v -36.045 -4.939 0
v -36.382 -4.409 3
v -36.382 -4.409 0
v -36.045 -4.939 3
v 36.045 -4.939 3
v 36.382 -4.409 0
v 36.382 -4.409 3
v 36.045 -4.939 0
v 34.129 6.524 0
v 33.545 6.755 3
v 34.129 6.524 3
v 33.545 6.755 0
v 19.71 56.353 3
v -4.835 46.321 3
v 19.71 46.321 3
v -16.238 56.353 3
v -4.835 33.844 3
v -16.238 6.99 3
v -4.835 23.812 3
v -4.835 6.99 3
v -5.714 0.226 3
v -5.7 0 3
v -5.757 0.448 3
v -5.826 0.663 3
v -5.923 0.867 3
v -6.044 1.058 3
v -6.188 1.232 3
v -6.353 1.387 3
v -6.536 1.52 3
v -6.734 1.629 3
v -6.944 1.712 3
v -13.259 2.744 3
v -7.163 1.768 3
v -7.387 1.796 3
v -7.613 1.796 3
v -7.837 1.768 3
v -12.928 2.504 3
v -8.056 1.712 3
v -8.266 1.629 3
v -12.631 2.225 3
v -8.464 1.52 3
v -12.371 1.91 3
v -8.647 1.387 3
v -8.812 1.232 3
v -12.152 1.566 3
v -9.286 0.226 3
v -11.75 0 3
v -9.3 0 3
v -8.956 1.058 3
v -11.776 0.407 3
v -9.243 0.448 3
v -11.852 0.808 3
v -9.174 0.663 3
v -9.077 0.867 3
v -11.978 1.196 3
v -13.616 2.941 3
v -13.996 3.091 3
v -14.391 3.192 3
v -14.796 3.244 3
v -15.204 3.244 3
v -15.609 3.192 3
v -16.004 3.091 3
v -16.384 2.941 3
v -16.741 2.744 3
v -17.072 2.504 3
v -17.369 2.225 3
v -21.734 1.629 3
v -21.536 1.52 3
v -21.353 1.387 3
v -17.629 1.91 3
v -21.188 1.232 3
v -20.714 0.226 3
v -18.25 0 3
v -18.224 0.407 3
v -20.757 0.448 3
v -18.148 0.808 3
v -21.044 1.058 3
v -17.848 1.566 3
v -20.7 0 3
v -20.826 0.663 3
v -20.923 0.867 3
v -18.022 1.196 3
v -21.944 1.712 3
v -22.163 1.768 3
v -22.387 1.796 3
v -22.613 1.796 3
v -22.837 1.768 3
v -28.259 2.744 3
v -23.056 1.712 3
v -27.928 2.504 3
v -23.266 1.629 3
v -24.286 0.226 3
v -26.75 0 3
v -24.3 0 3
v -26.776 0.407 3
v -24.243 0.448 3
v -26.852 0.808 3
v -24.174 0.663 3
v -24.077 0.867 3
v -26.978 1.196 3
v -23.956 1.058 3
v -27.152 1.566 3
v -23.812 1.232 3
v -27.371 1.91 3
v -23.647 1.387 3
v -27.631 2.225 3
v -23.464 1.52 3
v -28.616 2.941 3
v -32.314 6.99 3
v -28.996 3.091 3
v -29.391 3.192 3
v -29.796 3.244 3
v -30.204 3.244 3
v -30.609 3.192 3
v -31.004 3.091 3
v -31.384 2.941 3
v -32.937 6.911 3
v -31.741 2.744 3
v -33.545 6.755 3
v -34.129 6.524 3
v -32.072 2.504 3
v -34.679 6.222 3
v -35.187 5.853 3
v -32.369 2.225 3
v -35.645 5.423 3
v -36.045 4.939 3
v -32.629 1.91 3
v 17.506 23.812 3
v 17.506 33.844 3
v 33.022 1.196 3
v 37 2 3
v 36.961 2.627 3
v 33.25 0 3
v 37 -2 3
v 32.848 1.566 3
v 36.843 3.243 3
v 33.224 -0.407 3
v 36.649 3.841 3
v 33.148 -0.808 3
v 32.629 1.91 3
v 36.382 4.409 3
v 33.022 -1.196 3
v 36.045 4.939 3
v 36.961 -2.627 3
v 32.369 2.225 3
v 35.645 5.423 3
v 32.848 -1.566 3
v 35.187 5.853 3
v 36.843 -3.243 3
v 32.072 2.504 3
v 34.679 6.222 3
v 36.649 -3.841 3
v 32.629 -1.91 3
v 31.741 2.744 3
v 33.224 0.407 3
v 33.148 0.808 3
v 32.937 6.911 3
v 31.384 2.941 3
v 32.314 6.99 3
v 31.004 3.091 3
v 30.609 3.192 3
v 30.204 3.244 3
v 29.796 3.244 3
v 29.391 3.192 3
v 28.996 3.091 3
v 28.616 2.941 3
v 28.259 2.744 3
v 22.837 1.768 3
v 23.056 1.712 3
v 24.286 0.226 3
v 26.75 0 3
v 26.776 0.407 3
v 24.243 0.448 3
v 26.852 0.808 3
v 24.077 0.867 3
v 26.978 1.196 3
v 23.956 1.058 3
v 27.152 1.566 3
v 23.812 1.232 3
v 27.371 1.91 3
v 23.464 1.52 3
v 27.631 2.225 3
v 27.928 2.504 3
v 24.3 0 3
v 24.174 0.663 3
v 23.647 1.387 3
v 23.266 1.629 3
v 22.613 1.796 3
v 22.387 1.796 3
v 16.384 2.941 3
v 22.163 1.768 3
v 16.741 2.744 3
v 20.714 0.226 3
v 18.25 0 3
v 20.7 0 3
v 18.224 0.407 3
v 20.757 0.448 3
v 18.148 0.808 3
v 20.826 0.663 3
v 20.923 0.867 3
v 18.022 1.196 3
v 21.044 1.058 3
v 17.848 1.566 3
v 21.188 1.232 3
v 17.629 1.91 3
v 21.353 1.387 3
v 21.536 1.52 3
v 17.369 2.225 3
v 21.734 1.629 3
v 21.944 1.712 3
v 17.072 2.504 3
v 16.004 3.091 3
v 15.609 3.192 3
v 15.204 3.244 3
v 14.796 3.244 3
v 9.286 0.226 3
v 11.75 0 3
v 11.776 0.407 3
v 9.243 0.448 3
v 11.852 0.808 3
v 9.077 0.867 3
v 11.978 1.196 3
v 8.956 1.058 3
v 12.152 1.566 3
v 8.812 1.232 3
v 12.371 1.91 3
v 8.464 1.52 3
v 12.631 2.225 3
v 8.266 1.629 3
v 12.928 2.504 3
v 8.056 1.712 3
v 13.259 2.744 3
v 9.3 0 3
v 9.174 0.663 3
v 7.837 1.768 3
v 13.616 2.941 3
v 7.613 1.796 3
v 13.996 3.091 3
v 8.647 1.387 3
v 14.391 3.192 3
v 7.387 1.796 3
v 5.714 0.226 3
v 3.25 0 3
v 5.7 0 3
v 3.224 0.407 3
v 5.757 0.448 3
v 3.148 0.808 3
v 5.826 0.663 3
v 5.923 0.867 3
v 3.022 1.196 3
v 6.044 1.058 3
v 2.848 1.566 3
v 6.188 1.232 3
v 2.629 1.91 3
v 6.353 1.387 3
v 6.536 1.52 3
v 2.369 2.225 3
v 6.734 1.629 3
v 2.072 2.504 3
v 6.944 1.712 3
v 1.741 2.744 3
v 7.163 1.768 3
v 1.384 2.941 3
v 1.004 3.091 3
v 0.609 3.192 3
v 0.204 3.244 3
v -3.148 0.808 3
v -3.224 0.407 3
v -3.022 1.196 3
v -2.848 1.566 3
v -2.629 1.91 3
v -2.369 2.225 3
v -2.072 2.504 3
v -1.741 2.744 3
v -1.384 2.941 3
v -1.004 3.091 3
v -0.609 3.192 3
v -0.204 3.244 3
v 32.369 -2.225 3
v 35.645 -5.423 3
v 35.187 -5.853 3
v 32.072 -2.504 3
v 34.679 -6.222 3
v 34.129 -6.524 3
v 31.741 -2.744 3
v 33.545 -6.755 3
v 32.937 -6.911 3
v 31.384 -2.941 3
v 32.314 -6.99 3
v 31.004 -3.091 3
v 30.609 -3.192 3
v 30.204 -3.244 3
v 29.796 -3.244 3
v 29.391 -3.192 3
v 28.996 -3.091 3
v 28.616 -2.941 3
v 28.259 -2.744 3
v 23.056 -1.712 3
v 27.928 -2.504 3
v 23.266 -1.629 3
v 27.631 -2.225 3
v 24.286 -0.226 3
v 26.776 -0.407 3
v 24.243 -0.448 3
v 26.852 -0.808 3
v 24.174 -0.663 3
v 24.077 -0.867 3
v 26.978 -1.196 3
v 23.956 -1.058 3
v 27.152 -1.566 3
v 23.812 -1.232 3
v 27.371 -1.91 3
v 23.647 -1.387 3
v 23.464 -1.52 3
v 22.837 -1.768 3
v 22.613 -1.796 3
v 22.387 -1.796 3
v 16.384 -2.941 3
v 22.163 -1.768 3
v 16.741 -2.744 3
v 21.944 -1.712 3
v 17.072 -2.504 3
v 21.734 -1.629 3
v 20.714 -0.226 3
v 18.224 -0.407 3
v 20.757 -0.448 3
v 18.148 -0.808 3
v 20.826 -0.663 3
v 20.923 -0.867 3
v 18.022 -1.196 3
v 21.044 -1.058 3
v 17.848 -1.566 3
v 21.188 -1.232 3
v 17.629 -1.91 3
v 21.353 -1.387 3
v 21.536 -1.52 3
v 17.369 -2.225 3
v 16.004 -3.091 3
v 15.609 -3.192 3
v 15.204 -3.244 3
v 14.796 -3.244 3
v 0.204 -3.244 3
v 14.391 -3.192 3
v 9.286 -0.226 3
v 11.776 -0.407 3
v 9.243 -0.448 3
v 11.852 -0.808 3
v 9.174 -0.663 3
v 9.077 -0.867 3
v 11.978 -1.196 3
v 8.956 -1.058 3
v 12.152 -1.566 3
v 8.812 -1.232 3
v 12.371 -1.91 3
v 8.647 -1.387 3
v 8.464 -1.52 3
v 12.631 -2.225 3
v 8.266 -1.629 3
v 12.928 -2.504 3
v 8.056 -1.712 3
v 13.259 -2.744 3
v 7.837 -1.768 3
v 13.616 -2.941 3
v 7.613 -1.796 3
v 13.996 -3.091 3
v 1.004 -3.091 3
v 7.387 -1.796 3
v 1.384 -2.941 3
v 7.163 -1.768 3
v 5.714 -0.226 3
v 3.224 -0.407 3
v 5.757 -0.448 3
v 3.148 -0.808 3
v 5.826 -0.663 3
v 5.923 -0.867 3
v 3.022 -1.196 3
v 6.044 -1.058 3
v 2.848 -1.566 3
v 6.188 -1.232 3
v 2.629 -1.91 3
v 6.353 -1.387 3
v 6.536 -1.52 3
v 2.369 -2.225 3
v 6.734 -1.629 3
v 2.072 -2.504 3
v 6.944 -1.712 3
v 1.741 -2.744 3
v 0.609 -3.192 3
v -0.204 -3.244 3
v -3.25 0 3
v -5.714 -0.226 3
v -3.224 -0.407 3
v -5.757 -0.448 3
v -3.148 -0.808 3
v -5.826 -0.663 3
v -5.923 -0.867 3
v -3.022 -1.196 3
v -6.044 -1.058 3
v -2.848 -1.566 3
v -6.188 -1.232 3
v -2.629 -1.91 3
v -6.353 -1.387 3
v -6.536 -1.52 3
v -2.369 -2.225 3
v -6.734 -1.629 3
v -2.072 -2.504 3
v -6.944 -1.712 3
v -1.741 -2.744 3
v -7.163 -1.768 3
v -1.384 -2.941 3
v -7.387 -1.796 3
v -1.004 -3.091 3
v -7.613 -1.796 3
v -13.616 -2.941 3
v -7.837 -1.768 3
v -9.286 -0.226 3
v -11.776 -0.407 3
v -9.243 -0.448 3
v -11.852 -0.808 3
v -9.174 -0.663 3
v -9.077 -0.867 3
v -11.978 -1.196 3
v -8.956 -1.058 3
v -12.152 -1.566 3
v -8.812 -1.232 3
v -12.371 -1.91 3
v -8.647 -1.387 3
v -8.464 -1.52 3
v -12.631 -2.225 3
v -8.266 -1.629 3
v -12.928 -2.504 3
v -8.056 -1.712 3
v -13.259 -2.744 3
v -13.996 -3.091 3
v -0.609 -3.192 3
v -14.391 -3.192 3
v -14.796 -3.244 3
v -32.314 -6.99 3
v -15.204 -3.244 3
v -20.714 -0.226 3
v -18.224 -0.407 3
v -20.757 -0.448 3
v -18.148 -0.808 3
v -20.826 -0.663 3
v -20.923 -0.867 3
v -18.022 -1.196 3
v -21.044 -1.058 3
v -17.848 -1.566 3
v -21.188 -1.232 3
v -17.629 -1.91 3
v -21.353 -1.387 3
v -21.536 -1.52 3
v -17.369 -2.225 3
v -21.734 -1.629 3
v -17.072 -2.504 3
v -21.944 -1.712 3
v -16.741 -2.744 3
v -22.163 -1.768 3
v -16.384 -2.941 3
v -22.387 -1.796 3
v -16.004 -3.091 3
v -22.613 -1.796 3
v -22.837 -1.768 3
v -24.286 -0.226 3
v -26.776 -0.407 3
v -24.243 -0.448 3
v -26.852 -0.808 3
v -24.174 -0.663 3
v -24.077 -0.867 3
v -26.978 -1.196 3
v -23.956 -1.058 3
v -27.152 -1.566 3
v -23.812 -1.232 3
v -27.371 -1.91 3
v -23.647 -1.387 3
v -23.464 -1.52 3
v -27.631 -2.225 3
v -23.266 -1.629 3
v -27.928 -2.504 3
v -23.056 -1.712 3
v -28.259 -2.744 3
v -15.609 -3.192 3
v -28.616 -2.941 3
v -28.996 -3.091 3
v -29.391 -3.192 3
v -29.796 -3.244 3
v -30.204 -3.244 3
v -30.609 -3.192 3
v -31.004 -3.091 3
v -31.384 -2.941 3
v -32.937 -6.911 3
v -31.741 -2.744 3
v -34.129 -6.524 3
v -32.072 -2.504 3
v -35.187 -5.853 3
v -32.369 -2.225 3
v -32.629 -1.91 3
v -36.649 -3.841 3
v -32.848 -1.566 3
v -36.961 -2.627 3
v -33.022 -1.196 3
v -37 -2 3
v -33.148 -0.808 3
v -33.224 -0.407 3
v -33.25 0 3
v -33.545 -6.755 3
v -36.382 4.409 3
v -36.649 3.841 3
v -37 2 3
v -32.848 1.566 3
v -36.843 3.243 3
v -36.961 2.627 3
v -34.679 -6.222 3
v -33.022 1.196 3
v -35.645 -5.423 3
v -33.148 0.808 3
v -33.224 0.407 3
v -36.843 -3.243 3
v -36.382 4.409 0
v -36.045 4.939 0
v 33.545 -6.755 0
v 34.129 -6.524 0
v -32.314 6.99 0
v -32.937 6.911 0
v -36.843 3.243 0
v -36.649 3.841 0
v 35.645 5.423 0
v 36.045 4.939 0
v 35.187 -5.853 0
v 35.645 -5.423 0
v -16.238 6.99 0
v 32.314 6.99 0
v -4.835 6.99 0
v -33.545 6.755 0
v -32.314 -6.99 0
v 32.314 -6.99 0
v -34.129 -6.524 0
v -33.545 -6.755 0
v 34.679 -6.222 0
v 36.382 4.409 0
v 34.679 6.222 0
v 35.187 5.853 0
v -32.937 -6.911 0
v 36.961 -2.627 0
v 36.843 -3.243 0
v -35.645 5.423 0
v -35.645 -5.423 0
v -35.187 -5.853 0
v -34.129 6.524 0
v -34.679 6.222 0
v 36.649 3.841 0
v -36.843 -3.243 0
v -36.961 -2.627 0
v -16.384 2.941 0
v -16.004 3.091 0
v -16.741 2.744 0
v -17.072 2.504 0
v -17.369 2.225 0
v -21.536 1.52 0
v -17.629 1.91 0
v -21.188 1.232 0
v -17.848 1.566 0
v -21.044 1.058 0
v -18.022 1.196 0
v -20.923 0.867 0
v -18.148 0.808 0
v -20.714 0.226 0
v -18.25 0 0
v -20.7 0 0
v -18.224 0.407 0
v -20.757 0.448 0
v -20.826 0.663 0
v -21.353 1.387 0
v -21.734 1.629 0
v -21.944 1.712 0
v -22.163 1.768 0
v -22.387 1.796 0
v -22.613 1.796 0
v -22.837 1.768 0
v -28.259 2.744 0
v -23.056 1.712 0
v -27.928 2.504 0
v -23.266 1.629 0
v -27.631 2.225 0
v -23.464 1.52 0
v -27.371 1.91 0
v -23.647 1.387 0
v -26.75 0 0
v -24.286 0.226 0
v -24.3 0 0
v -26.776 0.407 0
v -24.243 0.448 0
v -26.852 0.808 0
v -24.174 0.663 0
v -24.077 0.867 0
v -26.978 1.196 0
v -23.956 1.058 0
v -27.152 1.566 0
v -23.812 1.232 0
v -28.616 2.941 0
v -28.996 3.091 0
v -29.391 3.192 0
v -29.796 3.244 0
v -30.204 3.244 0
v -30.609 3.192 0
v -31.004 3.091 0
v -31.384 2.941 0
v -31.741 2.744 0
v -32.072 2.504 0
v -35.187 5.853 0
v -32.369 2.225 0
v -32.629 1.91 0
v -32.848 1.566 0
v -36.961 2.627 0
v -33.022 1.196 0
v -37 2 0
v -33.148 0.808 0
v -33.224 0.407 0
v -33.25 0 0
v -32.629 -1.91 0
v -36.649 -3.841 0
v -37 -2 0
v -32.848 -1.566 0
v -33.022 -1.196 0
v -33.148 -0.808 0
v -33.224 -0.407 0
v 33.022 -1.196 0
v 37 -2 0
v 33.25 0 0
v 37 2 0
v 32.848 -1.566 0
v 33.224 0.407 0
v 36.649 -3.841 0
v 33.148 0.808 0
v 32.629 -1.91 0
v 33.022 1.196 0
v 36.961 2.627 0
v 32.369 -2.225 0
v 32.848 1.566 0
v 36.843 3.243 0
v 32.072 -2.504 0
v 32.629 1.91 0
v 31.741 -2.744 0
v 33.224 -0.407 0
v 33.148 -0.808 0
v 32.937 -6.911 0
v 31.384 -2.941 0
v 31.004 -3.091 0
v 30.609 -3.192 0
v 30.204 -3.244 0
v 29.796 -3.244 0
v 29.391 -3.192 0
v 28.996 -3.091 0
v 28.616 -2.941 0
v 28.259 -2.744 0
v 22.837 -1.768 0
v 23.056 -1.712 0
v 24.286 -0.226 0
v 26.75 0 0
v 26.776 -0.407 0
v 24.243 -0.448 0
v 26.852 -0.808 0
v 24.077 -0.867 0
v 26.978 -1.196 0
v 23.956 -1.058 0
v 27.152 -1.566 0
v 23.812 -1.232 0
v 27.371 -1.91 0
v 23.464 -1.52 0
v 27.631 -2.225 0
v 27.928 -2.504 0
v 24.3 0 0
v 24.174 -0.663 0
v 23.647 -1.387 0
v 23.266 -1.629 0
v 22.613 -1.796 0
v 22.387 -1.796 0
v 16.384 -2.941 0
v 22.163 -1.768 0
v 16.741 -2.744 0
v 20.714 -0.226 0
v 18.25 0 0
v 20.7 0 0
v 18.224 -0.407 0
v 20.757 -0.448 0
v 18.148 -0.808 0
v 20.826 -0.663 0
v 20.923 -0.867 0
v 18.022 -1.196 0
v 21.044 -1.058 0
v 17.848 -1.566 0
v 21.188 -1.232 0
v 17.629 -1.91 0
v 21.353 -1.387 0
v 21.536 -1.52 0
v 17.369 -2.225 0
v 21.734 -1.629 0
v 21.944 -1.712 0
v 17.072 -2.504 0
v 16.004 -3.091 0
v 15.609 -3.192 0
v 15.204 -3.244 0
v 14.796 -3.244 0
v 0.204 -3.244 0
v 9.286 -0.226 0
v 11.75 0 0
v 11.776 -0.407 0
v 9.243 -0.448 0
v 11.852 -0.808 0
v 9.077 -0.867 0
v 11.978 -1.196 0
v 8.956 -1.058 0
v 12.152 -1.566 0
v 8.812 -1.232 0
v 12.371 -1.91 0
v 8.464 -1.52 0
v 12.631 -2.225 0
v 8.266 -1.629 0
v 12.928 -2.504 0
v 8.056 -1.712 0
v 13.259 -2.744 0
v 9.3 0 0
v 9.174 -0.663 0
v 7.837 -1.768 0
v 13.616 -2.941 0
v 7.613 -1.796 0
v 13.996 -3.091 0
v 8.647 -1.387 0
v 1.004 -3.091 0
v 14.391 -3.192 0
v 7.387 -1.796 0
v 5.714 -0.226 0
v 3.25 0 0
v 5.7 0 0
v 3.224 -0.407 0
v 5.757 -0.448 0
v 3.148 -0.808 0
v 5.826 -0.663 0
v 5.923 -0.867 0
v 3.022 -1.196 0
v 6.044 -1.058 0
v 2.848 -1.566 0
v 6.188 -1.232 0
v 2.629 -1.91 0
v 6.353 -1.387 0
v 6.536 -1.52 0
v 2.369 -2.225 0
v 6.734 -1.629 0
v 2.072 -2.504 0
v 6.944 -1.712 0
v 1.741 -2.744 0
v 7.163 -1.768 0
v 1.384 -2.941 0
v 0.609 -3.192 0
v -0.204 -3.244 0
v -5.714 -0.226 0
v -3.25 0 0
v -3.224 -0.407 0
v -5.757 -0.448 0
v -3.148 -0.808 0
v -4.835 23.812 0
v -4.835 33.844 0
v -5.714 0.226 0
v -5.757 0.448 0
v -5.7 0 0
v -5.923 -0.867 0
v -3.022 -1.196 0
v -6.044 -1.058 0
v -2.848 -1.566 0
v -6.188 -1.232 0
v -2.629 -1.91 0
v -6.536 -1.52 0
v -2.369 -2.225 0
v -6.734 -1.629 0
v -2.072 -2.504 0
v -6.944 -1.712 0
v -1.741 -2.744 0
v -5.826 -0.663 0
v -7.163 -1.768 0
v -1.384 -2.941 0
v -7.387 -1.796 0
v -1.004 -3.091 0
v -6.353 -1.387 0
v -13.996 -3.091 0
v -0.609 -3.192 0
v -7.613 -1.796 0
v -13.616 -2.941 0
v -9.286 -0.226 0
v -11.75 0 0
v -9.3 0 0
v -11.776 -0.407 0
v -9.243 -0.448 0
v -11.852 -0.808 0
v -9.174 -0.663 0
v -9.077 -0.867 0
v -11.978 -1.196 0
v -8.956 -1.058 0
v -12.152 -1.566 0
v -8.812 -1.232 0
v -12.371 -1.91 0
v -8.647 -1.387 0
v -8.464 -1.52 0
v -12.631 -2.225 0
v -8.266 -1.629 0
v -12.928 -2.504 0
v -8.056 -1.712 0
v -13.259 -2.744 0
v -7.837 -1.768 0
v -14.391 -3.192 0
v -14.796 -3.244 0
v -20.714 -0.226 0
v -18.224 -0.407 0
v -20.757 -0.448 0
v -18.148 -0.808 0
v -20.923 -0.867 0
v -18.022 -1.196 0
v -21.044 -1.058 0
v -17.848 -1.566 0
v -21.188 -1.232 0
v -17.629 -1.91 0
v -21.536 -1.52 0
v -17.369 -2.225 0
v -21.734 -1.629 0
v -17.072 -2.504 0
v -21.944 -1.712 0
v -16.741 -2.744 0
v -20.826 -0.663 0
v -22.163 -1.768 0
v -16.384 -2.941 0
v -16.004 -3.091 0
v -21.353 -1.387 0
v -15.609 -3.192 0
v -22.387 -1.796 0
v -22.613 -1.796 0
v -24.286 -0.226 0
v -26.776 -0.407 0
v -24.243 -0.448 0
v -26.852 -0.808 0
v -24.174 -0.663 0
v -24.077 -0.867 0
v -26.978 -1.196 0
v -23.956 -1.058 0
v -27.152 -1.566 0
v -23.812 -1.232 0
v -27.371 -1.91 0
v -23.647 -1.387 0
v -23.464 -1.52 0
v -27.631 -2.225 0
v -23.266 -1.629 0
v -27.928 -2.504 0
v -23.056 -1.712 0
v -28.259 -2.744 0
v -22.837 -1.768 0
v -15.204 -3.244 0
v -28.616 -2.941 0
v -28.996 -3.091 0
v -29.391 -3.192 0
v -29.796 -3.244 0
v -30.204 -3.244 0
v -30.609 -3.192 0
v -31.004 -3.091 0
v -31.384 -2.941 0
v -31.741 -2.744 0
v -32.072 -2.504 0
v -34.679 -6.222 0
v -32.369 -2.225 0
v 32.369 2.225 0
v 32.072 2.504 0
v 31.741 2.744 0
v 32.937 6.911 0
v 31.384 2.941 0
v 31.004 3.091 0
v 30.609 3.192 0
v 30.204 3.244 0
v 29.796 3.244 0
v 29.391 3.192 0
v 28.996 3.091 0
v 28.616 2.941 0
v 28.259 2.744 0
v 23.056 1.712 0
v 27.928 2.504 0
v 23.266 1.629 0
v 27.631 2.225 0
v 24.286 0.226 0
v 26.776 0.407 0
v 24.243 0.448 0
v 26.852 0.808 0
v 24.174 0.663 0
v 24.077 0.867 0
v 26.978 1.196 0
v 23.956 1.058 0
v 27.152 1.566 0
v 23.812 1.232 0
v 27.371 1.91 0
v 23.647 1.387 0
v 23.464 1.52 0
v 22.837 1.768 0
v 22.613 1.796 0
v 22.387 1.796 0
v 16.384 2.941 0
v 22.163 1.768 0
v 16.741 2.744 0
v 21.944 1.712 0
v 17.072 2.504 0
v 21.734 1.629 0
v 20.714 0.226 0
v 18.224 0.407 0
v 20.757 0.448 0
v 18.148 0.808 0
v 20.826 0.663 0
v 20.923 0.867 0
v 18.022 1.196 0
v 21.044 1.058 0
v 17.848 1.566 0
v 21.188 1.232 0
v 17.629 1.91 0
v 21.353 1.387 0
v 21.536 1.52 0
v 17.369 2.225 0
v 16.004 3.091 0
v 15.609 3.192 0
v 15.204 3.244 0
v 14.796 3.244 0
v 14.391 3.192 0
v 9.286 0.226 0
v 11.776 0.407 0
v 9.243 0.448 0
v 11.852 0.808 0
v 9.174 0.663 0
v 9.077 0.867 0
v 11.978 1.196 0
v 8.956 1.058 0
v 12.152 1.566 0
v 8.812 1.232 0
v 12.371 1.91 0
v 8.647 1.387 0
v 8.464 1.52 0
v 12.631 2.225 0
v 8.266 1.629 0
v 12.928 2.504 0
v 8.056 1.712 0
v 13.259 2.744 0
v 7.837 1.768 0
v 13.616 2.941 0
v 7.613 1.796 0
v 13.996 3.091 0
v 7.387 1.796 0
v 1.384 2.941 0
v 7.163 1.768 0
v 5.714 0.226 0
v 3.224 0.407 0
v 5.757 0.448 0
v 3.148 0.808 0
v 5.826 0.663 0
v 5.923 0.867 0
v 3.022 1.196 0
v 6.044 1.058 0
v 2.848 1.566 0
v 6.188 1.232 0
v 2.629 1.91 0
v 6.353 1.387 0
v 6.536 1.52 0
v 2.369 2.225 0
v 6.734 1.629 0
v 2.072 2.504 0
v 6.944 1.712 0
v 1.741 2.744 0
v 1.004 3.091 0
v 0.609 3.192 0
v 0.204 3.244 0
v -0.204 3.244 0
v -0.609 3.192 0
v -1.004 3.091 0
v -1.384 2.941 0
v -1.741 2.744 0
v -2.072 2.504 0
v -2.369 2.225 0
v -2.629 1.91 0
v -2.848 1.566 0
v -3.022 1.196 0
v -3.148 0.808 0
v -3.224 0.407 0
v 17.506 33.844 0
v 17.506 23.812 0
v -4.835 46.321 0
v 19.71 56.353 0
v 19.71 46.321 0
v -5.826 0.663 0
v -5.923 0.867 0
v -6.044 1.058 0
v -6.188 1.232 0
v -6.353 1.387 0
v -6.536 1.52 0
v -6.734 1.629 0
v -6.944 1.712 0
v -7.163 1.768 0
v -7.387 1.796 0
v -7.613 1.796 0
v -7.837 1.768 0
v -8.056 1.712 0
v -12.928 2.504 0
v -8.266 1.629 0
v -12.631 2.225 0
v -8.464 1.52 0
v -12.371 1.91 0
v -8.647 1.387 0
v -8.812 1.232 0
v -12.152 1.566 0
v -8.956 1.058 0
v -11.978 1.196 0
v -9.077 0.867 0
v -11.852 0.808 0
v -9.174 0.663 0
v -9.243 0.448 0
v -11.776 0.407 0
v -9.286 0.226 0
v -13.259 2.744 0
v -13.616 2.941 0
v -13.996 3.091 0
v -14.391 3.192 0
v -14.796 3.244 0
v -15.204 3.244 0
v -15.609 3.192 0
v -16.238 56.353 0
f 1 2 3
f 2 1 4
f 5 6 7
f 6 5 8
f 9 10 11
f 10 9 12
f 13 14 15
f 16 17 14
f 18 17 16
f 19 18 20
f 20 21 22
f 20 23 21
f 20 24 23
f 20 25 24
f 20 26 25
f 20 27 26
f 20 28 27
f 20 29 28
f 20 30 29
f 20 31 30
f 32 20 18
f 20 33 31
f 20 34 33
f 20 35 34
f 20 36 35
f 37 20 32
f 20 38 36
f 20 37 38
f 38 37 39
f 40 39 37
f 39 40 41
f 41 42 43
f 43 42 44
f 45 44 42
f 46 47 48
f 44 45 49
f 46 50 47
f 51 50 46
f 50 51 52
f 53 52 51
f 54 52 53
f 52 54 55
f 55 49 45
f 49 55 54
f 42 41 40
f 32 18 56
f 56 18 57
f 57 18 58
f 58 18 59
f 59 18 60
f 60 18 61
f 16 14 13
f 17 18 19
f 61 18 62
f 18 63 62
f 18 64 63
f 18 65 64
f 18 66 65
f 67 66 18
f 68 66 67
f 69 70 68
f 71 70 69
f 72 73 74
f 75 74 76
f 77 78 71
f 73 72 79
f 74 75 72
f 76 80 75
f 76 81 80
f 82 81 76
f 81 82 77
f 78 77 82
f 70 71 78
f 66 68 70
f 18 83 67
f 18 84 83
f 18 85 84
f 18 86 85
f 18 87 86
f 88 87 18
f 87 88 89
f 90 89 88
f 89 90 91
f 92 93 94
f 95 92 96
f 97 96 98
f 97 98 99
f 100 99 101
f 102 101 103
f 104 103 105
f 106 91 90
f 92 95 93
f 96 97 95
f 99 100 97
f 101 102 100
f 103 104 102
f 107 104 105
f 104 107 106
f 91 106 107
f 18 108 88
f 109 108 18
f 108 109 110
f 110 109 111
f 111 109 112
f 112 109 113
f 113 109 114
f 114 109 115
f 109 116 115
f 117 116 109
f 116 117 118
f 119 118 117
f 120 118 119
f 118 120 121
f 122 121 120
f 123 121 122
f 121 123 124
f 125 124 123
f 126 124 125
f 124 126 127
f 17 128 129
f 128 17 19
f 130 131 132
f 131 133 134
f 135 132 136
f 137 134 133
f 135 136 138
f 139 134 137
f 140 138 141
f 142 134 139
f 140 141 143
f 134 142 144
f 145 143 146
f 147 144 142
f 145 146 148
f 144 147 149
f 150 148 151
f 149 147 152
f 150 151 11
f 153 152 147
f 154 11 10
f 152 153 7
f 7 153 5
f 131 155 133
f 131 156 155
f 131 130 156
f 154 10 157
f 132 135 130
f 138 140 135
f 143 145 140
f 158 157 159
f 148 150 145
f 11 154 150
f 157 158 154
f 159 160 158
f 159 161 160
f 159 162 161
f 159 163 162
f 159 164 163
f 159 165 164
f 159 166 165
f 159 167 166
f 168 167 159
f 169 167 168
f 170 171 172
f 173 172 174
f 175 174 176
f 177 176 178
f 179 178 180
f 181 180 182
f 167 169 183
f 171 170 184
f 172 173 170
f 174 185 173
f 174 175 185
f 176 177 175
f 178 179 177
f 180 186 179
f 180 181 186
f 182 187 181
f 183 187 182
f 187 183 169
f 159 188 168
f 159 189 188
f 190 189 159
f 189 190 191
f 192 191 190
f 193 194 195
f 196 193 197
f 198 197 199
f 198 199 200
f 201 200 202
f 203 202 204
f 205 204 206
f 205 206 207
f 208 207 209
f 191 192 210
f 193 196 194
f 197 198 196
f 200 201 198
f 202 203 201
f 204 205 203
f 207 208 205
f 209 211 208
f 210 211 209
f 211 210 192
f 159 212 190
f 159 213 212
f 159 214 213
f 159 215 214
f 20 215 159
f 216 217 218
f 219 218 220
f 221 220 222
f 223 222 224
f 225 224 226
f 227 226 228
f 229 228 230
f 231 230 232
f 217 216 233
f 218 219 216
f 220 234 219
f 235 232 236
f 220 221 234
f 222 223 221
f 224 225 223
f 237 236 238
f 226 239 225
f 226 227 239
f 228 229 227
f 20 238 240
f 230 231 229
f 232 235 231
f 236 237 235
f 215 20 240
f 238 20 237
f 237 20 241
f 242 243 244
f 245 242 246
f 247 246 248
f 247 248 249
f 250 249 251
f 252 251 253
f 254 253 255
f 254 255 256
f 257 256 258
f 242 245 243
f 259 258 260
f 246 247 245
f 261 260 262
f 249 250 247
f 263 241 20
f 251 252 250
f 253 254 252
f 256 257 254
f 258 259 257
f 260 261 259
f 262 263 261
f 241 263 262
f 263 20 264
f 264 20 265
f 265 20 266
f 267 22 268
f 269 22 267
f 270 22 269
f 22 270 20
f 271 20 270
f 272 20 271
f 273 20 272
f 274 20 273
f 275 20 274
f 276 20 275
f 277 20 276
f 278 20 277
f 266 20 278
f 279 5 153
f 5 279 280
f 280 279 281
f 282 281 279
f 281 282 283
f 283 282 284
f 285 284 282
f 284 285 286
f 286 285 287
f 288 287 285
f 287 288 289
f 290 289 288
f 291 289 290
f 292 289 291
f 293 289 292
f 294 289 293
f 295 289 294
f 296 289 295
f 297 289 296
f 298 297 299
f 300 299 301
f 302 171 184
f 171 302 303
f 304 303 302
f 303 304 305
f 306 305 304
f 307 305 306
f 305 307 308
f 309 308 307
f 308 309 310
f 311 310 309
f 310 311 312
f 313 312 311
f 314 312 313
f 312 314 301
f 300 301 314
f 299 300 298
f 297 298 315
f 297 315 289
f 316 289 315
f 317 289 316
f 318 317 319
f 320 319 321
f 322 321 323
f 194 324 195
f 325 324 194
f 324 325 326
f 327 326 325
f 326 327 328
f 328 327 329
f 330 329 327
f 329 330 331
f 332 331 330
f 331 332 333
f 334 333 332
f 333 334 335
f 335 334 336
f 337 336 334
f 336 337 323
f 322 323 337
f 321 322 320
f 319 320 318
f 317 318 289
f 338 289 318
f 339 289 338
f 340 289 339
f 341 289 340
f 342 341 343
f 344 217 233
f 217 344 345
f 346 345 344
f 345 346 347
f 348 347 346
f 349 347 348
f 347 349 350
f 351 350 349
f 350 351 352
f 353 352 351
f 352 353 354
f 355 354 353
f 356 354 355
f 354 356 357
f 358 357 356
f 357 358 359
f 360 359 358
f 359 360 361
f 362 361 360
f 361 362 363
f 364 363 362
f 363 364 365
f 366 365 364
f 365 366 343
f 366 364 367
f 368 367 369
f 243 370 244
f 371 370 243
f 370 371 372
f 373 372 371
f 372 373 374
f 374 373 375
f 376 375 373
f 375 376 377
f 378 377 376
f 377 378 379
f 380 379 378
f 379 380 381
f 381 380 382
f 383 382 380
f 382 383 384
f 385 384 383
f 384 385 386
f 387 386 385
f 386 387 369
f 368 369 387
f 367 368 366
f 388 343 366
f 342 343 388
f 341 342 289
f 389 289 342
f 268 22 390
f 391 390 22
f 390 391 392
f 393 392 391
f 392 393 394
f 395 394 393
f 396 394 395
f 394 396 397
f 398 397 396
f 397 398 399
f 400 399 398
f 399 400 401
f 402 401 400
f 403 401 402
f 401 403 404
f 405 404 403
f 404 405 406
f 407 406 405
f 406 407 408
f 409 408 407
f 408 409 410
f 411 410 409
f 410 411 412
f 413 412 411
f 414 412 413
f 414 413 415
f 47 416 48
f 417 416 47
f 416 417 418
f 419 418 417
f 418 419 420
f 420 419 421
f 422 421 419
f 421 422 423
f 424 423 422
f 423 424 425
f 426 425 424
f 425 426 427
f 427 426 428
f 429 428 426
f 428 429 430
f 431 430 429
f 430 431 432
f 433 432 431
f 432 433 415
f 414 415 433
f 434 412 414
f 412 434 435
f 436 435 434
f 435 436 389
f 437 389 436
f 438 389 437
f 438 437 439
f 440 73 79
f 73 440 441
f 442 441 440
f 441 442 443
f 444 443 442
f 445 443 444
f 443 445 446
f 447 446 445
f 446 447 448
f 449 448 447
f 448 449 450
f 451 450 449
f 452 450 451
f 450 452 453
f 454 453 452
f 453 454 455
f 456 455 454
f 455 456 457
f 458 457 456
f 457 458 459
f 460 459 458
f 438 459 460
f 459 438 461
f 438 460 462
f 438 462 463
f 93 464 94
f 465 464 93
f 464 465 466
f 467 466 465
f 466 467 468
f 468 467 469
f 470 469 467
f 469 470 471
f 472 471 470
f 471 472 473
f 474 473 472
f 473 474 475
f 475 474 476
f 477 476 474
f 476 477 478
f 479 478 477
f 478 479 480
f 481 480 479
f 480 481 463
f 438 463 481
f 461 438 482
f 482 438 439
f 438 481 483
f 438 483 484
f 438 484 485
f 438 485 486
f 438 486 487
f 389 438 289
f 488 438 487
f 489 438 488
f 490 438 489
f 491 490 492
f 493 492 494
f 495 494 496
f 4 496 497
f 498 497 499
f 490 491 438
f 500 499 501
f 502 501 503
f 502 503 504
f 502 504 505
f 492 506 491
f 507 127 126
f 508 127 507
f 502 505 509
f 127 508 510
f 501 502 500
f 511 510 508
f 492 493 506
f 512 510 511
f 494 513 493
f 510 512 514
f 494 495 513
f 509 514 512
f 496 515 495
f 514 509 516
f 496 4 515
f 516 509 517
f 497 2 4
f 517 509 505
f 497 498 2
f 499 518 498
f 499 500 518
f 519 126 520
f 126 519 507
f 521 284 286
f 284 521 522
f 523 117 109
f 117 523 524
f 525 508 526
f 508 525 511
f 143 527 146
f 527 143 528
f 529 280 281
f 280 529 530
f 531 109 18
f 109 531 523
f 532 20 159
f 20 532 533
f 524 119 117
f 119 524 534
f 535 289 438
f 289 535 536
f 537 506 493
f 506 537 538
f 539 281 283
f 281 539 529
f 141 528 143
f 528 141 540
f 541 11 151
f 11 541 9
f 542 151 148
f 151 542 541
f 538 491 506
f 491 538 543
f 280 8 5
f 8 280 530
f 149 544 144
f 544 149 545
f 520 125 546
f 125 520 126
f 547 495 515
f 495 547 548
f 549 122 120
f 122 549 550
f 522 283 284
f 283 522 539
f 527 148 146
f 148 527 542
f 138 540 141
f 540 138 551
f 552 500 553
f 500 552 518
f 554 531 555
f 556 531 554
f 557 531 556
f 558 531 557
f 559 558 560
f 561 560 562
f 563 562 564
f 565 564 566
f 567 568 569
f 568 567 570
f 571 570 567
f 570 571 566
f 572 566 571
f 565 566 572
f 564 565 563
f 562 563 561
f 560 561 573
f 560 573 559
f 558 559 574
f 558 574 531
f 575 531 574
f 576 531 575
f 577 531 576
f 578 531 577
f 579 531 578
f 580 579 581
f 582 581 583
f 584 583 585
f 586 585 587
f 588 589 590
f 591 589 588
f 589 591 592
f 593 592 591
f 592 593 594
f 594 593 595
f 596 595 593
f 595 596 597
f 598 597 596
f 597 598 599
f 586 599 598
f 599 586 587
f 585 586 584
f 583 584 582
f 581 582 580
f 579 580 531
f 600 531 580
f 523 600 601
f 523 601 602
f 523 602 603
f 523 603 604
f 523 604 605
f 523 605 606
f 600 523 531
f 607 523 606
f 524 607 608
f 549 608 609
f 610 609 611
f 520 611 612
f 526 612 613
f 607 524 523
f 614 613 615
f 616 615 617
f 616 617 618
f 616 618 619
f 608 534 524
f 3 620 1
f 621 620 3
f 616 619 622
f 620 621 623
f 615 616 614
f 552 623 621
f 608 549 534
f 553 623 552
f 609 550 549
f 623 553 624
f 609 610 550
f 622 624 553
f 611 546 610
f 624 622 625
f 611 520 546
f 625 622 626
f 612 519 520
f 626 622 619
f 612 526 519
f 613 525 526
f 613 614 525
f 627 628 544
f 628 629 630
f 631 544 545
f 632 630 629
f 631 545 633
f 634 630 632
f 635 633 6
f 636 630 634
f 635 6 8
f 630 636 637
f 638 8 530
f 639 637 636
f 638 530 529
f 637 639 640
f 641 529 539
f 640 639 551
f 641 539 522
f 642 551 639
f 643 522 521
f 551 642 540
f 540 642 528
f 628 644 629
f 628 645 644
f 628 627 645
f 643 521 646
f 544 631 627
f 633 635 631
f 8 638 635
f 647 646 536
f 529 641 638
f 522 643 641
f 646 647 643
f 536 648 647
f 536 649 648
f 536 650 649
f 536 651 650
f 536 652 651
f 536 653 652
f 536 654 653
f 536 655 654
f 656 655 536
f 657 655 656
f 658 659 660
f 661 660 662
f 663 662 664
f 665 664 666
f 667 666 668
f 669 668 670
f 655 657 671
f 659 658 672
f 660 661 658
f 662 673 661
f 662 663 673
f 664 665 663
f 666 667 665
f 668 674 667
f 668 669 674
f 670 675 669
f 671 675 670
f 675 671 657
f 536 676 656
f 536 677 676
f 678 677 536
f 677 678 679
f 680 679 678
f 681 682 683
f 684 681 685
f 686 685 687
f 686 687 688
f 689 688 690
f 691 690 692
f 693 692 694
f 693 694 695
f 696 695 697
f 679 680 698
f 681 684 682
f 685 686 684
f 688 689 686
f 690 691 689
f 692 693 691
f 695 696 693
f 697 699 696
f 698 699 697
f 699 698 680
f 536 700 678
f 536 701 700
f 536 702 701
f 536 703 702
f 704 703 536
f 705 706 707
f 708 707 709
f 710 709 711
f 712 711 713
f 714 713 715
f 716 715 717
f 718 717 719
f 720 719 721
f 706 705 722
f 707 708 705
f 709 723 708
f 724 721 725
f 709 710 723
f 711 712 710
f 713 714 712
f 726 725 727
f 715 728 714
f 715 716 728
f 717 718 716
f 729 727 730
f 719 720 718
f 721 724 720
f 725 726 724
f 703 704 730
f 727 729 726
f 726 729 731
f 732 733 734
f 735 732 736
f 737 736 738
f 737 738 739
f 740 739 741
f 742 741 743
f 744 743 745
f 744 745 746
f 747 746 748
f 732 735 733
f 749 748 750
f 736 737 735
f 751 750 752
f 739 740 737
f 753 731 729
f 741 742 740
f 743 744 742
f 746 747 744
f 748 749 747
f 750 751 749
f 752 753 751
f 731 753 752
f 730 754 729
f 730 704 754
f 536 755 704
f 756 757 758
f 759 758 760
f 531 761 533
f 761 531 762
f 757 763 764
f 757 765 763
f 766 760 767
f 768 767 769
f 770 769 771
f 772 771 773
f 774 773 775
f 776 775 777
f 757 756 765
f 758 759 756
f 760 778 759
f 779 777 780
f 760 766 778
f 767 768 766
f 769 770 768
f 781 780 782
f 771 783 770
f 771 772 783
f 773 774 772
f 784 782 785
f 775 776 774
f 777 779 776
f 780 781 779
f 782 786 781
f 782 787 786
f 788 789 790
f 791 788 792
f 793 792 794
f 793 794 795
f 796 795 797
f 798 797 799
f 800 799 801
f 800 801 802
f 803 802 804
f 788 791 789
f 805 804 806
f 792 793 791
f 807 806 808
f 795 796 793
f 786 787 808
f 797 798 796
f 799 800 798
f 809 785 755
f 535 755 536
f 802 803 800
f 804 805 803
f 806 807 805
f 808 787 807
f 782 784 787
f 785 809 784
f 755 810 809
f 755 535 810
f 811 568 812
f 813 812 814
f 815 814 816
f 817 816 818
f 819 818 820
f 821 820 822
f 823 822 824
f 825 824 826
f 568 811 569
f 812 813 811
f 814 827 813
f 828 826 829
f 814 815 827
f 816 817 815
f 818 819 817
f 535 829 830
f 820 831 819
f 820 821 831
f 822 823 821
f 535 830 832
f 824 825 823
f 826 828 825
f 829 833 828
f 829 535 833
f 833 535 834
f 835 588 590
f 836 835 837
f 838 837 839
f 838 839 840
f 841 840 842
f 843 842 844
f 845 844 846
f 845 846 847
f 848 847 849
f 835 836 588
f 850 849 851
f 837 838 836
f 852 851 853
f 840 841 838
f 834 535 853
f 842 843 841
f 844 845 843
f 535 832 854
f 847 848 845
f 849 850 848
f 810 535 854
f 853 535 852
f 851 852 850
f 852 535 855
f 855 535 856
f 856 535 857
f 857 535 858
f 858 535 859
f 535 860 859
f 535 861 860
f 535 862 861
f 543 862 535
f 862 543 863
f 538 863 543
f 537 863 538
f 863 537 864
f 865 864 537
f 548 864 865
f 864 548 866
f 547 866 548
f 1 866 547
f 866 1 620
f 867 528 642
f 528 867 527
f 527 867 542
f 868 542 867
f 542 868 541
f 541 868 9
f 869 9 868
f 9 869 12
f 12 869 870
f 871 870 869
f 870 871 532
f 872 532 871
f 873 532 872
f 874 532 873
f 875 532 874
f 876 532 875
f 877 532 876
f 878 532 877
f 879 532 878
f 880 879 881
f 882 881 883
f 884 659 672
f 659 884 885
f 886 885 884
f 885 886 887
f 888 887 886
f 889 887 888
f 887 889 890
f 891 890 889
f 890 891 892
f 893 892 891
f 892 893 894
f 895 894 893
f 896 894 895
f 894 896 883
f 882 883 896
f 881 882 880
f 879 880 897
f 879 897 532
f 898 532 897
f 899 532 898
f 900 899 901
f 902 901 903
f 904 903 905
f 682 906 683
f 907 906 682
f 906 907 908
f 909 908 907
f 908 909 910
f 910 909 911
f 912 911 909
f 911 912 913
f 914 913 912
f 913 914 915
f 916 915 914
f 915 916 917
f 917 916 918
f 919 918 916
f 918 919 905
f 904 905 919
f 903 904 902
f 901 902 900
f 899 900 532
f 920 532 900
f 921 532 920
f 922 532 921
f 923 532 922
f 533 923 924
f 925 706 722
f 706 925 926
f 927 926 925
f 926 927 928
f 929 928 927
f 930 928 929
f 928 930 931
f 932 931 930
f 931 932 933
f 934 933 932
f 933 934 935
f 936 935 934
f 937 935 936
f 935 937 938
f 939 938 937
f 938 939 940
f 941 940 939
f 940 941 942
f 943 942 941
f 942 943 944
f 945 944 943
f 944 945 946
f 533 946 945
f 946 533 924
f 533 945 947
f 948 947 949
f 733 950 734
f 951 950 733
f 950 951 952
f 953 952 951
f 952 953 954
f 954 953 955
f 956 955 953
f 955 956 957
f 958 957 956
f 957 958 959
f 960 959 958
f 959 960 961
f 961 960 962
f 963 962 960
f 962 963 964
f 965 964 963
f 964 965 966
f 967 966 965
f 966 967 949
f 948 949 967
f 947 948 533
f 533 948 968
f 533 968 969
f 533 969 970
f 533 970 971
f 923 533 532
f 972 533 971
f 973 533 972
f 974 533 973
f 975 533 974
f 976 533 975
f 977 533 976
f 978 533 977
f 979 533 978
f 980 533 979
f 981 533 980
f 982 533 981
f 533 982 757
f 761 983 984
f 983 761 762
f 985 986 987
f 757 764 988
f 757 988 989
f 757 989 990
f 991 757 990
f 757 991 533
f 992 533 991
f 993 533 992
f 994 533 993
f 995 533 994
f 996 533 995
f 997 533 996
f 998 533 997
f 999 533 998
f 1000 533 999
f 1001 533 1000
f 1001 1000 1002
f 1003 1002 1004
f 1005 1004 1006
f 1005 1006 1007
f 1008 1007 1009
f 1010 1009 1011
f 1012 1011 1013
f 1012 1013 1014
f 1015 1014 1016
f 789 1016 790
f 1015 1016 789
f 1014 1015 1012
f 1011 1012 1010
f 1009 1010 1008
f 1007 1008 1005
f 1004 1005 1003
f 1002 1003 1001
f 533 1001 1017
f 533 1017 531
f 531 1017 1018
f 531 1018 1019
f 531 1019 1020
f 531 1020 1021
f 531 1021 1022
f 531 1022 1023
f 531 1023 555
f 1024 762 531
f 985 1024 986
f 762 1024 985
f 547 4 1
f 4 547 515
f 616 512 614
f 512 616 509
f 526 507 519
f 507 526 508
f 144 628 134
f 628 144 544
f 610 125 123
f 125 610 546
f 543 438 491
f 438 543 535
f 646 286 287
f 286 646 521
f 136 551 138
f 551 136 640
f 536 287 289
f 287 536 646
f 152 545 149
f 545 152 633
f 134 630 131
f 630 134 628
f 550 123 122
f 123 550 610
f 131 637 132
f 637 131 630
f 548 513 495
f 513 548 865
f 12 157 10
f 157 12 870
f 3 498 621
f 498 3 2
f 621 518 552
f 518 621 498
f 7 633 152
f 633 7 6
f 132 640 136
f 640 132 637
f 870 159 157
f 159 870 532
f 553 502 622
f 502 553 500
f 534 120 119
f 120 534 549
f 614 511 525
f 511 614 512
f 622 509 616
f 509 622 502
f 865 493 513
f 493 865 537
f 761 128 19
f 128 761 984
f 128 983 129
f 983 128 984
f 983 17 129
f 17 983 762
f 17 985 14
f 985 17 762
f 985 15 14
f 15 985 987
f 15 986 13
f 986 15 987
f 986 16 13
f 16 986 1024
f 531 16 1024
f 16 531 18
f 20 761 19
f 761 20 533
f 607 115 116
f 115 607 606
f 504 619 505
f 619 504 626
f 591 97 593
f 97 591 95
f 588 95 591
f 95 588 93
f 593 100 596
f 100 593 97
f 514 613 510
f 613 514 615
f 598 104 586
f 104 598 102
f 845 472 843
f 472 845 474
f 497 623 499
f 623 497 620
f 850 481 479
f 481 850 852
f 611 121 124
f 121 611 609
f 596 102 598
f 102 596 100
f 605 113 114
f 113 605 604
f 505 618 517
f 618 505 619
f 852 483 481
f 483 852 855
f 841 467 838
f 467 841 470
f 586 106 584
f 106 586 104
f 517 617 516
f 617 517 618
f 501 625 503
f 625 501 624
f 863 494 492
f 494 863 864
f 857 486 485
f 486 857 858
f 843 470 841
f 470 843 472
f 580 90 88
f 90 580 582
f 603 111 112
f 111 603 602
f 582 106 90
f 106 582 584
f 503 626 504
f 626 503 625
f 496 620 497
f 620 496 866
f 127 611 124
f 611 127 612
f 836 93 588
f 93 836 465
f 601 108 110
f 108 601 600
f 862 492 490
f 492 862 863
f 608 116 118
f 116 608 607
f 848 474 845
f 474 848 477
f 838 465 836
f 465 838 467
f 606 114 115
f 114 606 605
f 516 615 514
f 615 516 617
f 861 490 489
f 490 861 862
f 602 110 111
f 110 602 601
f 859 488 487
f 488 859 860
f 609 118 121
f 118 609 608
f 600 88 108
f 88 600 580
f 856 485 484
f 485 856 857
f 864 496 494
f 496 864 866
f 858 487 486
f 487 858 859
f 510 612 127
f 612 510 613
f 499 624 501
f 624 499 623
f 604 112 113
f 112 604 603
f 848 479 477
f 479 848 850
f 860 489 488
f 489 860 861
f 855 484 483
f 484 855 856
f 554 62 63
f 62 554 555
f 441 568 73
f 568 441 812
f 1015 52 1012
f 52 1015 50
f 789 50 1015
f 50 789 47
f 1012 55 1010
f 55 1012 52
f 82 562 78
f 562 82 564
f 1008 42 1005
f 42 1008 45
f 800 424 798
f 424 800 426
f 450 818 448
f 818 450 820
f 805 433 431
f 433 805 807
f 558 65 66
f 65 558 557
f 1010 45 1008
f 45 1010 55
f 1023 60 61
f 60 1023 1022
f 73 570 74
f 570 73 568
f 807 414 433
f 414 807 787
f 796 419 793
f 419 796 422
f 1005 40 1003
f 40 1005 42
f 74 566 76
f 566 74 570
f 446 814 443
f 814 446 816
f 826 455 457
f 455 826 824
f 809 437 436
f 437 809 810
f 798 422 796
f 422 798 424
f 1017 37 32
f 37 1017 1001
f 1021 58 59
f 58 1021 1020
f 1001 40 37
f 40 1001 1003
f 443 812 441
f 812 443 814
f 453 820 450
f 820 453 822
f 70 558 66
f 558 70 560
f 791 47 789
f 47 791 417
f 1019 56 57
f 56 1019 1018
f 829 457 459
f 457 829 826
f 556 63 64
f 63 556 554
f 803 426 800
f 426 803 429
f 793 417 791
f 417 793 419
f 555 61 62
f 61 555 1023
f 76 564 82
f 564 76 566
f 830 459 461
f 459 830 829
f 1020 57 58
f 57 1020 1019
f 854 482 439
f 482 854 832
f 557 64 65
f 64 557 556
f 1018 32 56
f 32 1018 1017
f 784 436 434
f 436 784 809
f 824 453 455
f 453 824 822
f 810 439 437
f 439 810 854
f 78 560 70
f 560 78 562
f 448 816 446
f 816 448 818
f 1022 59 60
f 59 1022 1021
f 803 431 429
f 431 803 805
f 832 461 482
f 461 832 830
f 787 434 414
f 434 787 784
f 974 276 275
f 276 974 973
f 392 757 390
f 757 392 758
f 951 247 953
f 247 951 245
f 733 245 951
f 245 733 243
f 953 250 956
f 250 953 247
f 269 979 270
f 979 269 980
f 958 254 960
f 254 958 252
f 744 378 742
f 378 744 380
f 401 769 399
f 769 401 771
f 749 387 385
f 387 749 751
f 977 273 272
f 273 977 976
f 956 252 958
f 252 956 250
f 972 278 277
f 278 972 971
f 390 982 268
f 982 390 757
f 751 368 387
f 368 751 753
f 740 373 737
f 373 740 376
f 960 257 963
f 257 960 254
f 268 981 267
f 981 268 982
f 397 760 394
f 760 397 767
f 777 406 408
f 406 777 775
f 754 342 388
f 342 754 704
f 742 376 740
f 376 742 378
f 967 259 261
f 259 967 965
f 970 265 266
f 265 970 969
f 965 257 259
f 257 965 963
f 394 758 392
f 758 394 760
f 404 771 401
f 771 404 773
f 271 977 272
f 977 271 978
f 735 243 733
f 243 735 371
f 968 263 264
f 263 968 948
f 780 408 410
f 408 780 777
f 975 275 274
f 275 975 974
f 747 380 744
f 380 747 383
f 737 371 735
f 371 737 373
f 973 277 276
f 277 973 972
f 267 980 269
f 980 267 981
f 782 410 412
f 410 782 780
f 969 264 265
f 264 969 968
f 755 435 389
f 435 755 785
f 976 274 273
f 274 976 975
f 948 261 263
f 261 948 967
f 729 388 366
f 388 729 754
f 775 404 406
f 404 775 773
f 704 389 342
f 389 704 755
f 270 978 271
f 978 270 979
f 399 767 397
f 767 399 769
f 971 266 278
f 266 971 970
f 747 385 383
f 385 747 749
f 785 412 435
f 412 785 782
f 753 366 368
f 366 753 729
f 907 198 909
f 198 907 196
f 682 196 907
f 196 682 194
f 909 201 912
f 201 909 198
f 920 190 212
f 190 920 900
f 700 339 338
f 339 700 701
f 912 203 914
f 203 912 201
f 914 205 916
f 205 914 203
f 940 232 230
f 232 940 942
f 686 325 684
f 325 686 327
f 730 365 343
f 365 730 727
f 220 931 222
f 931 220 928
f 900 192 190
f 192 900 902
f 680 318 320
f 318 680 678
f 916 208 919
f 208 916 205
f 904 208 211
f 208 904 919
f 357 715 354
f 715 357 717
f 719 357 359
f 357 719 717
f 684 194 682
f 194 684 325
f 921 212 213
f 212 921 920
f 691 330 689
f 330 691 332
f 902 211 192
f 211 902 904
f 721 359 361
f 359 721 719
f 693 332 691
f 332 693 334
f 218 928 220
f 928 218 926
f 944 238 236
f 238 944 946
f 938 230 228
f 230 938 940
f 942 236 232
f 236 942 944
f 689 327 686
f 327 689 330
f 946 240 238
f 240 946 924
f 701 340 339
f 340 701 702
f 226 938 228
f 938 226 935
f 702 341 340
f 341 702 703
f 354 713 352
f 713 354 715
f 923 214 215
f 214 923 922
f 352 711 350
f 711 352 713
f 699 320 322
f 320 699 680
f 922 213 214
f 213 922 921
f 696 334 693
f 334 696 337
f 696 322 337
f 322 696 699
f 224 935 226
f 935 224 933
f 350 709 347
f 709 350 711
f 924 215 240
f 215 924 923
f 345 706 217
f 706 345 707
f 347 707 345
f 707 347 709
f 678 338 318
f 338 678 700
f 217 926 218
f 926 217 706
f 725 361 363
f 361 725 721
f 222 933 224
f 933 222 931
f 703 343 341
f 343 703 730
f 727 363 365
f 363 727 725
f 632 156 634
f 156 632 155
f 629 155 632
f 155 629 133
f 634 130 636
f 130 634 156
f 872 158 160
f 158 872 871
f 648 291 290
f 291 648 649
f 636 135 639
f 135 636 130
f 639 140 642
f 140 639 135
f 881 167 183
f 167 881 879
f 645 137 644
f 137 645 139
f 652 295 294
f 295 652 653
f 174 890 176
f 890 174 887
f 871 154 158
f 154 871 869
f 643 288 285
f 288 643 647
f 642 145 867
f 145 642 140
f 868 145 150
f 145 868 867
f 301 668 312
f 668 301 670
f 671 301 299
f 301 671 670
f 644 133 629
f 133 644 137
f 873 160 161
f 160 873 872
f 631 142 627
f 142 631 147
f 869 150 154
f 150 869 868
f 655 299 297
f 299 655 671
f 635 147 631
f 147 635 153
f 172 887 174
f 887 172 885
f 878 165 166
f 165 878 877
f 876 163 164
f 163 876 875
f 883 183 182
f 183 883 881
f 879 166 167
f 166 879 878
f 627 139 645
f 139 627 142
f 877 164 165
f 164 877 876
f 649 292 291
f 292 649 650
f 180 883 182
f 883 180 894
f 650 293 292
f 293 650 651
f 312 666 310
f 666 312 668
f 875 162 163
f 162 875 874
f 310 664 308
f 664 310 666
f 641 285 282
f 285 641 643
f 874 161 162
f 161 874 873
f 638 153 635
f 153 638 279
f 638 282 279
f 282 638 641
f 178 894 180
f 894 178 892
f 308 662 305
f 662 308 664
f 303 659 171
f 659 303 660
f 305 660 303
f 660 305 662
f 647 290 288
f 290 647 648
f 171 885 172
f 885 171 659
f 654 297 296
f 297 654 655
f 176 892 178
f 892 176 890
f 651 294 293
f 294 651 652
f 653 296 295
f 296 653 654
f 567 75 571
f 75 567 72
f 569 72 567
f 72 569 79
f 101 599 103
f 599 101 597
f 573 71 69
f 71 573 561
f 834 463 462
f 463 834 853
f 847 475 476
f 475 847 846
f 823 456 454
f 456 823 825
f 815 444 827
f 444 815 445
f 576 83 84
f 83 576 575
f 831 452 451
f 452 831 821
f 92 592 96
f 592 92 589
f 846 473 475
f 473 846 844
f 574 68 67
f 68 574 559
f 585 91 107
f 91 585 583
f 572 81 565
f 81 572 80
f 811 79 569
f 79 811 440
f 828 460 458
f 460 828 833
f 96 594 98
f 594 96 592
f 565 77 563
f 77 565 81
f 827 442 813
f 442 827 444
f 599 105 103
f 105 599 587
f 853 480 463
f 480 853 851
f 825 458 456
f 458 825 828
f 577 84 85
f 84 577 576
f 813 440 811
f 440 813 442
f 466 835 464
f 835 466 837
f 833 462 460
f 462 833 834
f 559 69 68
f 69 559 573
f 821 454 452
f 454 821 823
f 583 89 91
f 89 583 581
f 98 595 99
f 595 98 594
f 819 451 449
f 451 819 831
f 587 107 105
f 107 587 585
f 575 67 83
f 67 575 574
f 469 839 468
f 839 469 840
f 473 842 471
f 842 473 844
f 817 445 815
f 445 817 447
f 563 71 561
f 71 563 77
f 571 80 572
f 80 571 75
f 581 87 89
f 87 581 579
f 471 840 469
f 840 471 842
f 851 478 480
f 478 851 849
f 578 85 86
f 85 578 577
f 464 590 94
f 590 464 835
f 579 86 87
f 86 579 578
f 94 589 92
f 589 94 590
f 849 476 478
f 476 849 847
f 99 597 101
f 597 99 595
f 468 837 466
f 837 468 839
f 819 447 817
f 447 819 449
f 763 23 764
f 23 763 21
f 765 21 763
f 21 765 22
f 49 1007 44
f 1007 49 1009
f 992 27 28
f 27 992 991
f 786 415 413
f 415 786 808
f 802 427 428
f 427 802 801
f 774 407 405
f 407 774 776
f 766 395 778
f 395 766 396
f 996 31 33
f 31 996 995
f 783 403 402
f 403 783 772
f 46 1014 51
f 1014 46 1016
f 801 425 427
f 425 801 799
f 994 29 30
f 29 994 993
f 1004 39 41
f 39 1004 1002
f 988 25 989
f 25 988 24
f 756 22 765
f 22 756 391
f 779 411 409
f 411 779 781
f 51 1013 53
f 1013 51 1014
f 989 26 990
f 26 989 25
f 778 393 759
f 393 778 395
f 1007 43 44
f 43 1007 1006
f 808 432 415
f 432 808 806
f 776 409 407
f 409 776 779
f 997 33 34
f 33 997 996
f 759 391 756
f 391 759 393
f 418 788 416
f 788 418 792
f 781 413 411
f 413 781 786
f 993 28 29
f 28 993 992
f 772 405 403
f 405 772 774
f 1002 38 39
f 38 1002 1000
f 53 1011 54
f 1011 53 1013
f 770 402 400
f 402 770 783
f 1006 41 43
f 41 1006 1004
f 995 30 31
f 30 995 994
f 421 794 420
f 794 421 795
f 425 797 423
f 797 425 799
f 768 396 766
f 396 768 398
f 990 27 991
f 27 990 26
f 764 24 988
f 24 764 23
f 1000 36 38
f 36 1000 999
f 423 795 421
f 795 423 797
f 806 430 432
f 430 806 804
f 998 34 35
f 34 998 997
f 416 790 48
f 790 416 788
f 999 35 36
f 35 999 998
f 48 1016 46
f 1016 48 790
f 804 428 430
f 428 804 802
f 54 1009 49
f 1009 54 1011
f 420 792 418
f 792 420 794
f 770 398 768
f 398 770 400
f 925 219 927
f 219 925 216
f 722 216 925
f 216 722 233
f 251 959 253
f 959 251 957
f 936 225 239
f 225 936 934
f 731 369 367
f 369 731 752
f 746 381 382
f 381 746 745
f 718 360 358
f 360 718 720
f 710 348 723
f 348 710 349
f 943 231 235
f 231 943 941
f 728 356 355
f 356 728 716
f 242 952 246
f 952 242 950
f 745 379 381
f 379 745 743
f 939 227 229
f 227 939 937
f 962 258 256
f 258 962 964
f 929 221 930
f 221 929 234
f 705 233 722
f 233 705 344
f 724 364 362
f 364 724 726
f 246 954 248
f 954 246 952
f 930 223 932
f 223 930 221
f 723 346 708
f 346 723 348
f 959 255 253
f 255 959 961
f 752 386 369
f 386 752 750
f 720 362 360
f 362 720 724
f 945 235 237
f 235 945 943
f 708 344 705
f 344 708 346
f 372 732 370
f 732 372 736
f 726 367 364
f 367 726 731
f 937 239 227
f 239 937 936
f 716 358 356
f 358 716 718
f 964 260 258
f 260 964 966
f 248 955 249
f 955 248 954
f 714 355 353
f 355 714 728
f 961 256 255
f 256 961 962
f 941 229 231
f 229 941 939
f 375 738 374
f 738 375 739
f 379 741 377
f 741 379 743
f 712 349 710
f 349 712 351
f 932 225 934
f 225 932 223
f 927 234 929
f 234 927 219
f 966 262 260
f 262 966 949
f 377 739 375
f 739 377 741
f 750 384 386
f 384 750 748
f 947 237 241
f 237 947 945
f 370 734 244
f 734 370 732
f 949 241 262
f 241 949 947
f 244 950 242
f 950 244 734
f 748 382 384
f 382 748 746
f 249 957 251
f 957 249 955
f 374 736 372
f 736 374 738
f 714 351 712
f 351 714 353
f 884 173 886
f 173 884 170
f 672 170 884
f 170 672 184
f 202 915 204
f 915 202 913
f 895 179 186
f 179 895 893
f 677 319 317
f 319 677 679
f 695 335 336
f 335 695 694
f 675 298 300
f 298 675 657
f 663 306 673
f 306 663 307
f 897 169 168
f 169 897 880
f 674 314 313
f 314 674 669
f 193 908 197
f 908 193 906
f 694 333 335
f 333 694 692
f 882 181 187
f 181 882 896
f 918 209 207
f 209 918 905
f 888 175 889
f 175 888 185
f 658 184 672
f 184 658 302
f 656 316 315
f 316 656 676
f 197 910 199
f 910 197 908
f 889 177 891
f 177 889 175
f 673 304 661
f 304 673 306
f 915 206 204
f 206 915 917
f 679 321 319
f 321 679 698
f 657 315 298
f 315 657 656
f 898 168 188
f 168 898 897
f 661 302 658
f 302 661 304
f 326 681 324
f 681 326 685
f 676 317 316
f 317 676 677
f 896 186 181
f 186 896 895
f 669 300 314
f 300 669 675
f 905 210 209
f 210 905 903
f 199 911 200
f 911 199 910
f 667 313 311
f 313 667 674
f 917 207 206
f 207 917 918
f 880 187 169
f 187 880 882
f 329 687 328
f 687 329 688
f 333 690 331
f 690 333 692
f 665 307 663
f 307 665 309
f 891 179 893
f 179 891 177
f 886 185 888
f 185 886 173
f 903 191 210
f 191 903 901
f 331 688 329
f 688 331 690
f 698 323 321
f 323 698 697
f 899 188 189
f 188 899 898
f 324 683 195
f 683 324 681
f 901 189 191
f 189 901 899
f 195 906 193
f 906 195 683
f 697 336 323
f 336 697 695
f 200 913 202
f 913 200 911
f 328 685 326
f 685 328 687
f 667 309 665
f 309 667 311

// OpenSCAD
$fn = 50;


difference() {
	union() {
		hull() {
			translate(v = [-32.0000000000, 2.0000000000, 0]) {
				cylinder(h = 3, r = 5);
			}
			translate(v = [32.0000000000, 2.0000000000, 0]) {
				cylinder(h = 3, r = 5);
			}
			translate(v = [-32.0000000000, -2.0000000000, 0]) {
				cylinder(h = 3, r = 5);
			}
			translate(v = [32.0000000000, -2.0000000000, 0]) {
				cylinder(h = 3, r = 5);
			}
		}
		translate(v = [0, 55, 0]) {
			linear_extrude(height = 3) {
				text(font = "DejaVu Sans Mono:style=Bold", halign = "center", size = 57.0000000000, text = "F", valign = "top");
			}
		}
	}
	union() {
		translate(v = [-30.0000000000, 0.0000000000, 0]) {
			translate(v = [0, 0, -100]) {
				cylinder(h = 200, r = 3.2500000000);
			}
		}
		translate(v = [-15.0000000000, 0.0000000000, 0]) {
			translate(v = [0, 0, -100]) {
				cylinder(h = 200, r = 3.2500000000);
			}
		}
		translate(v = [0, 0, -100]) {
			cylinder(h = 200, r = 3.2500000000);
		}
		translate(v = [15.0000000000, 0.0000000000, 0]) {
			translate(v = [0, 0, -100]) {
				cylinder(h = 200, r = 3.2500000000);
			}
		}
		translate(v = [30.0000000000, 0.0000000000, 0]) {
			translate(v = [0, 0, -100]) {
				cylinder(h = 200, r = 3.2500000000);
			}
		}
		translate(v = [-30.0000000000, 0.0000000000, 0]) {
			translate(v = [0, 0, -100]) {
				cylinder(h = 200, r = 1.8000000000);
			}
		}
		translate(v = [-22.5000000000, 0.0000000000, 0]) {
			translate(v = [0, 0, -100]) {
				cylinder(h = 200, r = 1.8000000000);
			}
		}
		translate(v = [-15.0000000000, 0.0000000000, 0]) {
			translate(v = [0, 0, -100]) {
				cylinder(h = 200, r = 1.8000000000);
			}
		}
		translate(v = [-7.5000000000, 0.0000000000, 0]) {
			translate(v = [0, 0, -100]) {
				cylinder(h = 200, r = 1.8000000000);
			}
		}
		translate(v = [0, 0, -100]) {
			cylinder(h = 200, r = 1.8000000000);
		}
		translate(v = [7.5000000000, 0.0000000000, 0]) {
			translate(v = [0, 0, -100]) {
				cylinder(h = 200, r = 1.8000000000);
			}
		}
		translate(v = [15.0000000000, 0.0000000000, 0]) {
			translate(v = [0, 0, -100]) {
				cylinder(h = 200, r = 1.8000000000);
			}
		}
		translate(v = [22.5000000000, 0.0000000000, 0]) {
			translate(v = [0, 0, -100]) {
				cylinder(h = 200, r = 1.8000000000);
			}
		}
		translate(v = [30.0000000000, 0.0000000000, 0]) {
			translate(v = [0, 0, -100]) {
				cylinder(h = 200, r = 1.8000000000);
			}
		}
	}
}
